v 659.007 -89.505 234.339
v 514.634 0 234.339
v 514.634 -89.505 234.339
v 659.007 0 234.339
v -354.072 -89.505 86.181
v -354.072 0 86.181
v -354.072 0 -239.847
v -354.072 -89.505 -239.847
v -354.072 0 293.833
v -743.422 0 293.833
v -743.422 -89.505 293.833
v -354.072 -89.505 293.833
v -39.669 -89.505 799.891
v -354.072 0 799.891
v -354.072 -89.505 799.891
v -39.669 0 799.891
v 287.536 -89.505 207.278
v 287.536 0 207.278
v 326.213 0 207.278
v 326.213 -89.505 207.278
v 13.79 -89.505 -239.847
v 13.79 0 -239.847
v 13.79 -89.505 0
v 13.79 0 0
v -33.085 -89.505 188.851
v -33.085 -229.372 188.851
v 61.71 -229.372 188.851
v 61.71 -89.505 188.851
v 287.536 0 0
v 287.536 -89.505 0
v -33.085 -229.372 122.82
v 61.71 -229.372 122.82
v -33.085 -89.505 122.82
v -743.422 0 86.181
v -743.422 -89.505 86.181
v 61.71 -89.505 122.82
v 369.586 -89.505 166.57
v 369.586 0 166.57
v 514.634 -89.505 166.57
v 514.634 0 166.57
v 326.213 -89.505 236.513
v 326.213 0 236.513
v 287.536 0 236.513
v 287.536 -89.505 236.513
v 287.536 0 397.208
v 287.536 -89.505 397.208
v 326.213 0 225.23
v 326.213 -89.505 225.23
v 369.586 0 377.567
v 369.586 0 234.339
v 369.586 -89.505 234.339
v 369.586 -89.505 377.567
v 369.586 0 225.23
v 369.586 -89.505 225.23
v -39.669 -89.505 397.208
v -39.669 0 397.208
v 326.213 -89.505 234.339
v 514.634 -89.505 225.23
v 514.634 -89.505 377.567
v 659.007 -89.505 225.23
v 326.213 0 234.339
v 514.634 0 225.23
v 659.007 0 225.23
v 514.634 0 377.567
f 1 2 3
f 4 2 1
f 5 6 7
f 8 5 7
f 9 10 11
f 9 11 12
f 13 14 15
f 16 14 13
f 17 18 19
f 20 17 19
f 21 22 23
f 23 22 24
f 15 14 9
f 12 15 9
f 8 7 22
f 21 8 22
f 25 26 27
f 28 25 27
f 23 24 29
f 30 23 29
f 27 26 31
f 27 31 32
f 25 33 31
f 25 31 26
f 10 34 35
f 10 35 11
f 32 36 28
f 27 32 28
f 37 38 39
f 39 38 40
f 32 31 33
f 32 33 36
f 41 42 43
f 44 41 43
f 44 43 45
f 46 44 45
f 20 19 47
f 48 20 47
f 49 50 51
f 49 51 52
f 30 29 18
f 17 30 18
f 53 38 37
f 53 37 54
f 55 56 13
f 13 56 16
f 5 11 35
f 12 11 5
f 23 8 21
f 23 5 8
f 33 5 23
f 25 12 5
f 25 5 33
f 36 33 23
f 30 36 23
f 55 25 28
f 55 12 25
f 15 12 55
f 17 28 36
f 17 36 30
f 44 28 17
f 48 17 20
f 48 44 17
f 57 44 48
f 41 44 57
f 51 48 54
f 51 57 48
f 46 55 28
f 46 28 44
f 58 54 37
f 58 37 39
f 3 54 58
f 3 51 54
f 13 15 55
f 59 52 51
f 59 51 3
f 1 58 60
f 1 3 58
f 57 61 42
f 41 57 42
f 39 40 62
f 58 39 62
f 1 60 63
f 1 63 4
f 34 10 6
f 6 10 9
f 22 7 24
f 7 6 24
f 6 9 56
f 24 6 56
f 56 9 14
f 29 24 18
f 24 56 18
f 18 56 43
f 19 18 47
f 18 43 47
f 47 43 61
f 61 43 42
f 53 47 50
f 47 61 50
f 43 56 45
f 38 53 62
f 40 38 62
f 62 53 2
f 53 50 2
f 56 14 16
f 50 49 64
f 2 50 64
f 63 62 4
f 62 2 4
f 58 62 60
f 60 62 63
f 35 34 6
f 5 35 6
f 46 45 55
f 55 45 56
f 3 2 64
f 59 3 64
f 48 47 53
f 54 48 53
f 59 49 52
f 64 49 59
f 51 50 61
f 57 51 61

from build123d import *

# Parameters (mm, degrees)
F0_W     = 94.794575125
F0_H     = 66.0311877728
F1_DEPTH = 229.37163
F2_W     = 367.8625924513
F2_H     = 239.847317338
F2_W_2   = 389.3495500088
F2_H_2   = 207.6520100236
F2_W_3   = 314.4028186798
F2_H_3   = 402.6826024055
F2_W_4   = 43.3726906776
F2_H_4   = 9.1089755297
F2_W_5   = 145.0487077236
F2_H_5   = 58.66086483
F2_H_6   = 143.2274132967
F2_W_6   = 144.3722844124
F3_DEPTH = 89.50501


with BuildPart() as f1:
    # F0 (on Front) → F1 (new body)
    with BuildSketch(Plane.XZ):
        with Locations((14.3123473972, 155.8356285095)):
            Rectangle(F0_W, F0_H)
    extrude(amount=F1_DEPTH)

    # F2 (on Front) → F3 (join)
    with BuildSketch(Plane.XZ):
        with Locations((-170.1408275403, -119.923658669)):
            Rectangle(F2_W, F2_H)
        Polygon((-354.0721237659, 0), (13.7904686853, 0), (287.5355780125, 0), (287.5355780125, 207.2783261538), (287.5355780125, 236.5134656429), (287.5355780125, 397.2084522247), (-39.6693050861, 397.2084522247), (-354.0721237659, 397.2084522247), (-354.0721237659, 293.8325405121), (-354.0721237659, 86.1805304885), align=None)
        with Locations((-548.7468987703, 190.0065355003)):
            Rectangle(F2_W_2, F2_H_2)
        Polygon((287.5355780125, 236.5134656429), (287.5355780125, 207.2783261538), (326.2129127979, 207.2783261538), (326.2129127979, 225.2303659916), (326.2129127979, 234.3393415213), (326.2129127979, 236.5134656429), align=None)
        with Locations((-196.870714426, 598.5497534275)):
            Rectangle(F2_W_3, F2_H_3)
        with Locations((347.8992581367, 229.7848537564)):
            Rectangle(F2_W_4, F2_H_4)
        with Locations((442.1099573374, 229.7848537564)):
            Rectangle(F2_W_5, F2_H_4)
        with Locations((442.1099573374, 195.8999335766)):
            Rectangle(F2_W_5, F2_H_5)
        with Locations((442.1099573374, 305.9530481696)):
            Rectangle(F2_W_5, F2_H_6)
        with Locations((586.8204534054, 229.7848537564)):
            Rectangle(F2_W_6, F2_H_4)
    extrude(amount=F3_DEPTH)


solid = f1.part
